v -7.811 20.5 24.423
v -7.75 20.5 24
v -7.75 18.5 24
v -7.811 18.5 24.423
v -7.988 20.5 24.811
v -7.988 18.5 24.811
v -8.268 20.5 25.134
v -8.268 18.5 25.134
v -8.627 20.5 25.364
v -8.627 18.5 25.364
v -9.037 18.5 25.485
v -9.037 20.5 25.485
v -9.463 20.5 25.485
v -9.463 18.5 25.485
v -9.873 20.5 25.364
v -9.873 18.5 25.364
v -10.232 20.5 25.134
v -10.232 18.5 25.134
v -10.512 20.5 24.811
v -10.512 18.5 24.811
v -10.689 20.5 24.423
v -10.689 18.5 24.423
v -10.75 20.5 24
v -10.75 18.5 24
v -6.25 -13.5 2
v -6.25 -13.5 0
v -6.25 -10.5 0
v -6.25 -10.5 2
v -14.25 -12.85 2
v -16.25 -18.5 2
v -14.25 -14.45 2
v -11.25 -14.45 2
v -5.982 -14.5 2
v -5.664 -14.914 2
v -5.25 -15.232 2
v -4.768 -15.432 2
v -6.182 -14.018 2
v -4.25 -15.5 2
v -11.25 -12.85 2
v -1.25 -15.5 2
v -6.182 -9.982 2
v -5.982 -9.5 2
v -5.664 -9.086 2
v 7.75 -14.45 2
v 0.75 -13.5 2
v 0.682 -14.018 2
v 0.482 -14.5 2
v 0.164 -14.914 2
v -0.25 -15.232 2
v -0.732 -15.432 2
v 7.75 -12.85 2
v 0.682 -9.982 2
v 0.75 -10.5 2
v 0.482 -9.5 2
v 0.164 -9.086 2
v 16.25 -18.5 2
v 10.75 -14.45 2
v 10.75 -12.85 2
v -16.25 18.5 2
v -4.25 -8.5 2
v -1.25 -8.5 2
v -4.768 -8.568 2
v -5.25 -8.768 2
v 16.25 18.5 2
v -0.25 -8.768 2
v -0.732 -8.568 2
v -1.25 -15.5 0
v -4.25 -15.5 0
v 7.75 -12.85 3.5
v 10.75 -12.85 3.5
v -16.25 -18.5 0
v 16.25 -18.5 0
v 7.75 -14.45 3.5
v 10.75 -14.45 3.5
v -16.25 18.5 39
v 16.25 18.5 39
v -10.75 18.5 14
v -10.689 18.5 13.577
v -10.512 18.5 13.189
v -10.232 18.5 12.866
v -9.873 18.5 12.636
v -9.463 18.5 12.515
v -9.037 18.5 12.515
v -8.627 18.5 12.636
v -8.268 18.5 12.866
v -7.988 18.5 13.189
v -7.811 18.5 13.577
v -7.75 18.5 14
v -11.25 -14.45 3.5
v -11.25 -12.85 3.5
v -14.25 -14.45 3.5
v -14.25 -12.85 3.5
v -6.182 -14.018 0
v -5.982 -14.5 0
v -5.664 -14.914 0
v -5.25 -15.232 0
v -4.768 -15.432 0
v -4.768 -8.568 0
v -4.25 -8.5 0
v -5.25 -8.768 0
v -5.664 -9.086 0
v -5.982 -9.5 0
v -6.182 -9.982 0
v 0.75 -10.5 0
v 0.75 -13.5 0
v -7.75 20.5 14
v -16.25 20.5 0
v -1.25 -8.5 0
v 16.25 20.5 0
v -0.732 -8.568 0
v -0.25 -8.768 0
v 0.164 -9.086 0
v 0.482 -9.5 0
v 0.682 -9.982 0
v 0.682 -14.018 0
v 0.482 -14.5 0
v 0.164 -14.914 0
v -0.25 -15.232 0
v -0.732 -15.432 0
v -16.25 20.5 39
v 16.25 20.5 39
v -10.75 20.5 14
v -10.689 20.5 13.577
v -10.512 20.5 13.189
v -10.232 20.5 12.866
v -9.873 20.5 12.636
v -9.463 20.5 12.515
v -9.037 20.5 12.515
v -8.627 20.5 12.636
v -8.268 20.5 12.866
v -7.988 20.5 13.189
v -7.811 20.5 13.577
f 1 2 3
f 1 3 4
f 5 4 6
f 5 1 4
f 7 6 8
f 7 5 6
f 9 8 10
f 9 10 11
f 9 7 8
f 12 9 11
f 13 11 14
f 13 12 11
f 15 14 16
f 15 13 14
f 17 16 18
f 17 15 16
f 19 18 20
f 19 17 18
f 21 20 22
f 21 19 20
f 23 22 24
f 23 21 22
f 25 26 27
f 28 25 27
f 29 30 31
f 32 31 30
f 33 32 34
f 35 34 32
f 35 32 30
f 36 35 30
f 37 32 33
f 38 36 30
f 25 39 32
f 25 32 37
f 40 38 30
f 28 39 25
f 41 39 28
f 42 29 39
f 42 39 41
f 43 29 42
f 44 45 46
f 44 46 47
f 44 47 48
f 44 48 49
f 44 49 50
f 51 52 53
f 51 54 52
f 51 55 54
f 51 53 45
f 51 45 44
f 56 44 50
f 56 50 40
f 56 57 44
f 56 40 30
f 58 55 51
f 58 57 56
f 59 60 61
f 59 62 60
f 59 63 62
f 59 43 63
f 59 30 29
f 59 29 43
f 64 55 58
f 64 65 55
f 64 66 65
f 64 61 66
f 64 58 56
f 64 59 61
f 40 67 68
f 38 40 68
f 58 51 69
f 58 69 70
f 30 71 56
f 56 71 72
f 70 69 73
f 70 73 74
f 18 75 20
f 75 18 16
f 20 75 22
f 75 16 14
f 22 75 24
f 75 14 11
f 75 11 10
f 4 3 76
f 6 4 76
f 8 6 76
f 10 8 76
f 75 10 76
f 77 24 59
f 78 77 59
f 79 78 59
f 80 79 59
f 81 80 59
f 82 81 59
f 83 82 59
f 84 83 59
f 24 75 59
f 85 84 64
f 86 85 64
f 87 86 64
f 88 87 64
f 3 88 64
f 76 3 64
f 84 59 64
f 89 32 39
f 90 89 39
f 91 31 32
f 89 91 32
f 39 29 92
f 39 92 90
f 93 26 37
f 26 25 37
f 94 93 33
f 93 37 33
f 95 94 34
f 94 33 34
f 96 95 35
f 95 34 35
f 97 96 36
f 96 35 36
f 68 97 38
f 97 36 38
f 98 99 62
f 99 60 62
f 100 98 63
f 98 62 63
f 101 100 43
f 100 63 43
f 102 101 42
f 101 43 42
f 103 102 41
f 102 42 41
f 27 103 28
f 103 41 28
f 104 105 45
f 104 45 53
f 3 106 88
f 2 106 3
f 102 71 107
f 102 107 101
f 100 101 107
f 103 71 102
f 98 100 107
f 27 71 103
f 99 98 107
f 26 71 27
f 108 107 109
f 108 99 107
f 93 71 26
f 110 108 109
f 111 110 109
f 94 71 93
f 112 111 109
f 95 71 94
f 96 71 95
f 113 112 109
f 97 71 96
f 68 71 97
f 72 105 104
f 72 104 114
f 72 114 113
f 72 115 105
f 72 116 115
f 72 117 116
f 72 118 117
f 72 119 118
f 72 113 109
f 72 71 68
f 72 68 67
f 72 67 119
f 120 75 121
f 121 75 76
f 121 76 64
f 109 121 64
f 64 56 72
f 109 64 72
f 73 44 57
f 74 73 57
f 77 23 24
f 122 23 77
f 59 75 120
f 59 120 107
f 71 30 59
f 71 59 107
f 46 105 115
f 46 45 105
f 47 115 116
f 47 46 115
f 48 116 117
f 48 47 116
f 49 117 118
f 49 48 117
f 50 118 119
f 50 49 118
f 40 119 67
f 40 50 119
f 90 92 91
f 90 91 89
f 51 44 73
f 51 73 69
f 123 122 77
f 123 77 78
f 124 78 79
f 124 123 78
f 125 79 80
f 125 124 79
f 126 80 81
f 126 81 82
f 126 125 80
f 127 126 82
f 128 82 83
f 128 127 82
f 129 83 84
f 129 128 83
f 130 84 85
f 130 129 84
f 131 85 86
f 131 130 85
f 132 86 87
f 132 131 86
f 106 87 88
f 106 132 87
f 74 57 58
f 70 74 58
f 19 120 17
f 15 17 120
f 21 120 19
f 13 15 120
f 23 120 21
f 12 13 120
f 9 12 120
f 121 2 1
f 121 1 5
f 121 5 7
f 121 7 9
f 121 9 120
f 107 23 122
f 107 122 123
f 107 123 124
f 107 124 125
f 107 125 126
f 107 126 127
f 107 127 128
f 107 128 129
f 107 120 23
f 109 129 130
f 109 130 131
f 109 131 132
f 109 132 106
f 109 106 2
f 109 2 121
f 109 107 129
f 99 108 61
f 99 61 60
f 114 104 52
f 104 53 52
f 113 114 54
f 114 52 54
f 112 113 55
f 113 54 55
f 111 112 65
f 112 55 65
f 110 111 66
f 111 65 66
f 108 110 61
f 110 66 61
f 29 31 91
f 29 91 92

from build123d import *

# Parameters (mm, degrees)
SKETCH1_W           = 32.5
SKETCH1_H           = 37
BOSS_EXTRUDE1_DEPTH = 2
SKETCH2_W           = 3
SKETCH2_H           = 1.6
BOSS_EXTRUDE2_DEPTH = 1.5
SKETCH3_W           = 7
SKETCH3_H           = 7
CUT_EXTRUDE1_DEPTH  = 4.5
FILLET1_R           = 2
SKETCH4_W           = 32.5
SKETCH4_H           = 39
BOSS_EXTRUDE3_DEPTH = 2
CUT_EXTRUDE2_DEPTH  = 2


with BuildPart() as part:
    # Sketch1 → Boss-Extrude1 (new body)
    with BuildSketch(Plane.XY):
        Rectangle(SKETCH1_W, SKETCH1_H)
    extrude(amount=BOSS_EXTRUDE1_DEPTH)

    # Sketch2 → Boss-Extrude2 (add)
    with BuildSketch(Plane.XY.offset(2)):
        with Locations((-12.75, -13.65)):
            Rectangle(SKETCH2_W, SKETCH2_H)
        with Locations((9.25, -13.65)):
            Rectangle(SKETCH2_W, SKETCH2_H)
    extrude(amount=BOSS_EXTRUDE2_DEPTH)

    # Sketch3 → Cut-Extrude1 (cut, through all)
    with BuildSketch(Plane(origin=(0, 0, 0), x_dir=(-1, 0, 0), z_dir=(0, 0, -1))):
        with Locations((2.75, -12)):
            Rectangle(SKETCH3_W, SKETCH3_H)
    extrude(amount=-CUT_EXTRUDE1_DEPTH, mode=Mode.SUBTRACT)

    # Fillet1
    fillet1_edges = [part.edges().sort_by_distance(p)[0] for p in [
        (0.75, -15.5, 1),
        (0.75, -8.5, 1),
        (-6.25, -8.5, 1),
        (-6.25, -15.5, 1),
    ]]
    fillet(fillet1_edges, radius=FILLET1_R)

    # Sketch4 → Boss-Extrude3 (add)
    with BuildSketch(Plane(origin=(0, 18.5, 0), x_dir=(1, 0, 0), z_dir=(0, 1, 0))):
        with Locations((0, -19.5)):
            Rectangle(SKETCH4_W, SKETCH4_H)
    extrude(amount=BOSS_EXTRUDE3_DEPTH)

    # Sketch5 → Cut-Extrude2 (cut)
    with BuildSketch(Plane(origin=(0, 20.5, 0), x_dir=(1, 0, 0), z_dir=(0, 1, 0))):
        with BuildLine():
            Line((-10.75, -24), (-10.75, -14))
            ThreePointArc((-10.75, -14), (-9.25, -12.5), (-7.75, -14))
            Line((-7.75, -14), (-7.75, -24))
            ThreePointArc((-7.75, -24), (-9.25, -25.5), (-10.75, -24))
        make_face()
    extrude(amount=-CUT_EXTRUDE2_DEPTH, mode=Mode.SUBTRACT)


solid = part.part
